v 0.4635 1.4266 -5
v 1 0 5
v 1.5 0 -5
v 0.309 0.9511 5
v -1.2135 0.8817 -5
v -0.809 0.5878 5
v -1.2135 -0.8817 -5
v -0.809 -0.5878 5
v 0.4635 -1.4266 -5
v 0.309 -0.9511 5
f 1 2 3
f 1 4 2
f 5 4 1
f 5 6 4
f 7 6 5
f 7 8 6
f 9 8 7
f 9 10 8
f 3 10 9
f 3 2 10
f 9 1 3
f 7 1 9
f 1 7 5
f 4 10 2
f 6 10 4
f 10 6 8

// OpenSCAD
// Unit of length: Unit.MM
cylinder(h = 10.0, d1 = 3.0, d2 = 2.0, center = true);
